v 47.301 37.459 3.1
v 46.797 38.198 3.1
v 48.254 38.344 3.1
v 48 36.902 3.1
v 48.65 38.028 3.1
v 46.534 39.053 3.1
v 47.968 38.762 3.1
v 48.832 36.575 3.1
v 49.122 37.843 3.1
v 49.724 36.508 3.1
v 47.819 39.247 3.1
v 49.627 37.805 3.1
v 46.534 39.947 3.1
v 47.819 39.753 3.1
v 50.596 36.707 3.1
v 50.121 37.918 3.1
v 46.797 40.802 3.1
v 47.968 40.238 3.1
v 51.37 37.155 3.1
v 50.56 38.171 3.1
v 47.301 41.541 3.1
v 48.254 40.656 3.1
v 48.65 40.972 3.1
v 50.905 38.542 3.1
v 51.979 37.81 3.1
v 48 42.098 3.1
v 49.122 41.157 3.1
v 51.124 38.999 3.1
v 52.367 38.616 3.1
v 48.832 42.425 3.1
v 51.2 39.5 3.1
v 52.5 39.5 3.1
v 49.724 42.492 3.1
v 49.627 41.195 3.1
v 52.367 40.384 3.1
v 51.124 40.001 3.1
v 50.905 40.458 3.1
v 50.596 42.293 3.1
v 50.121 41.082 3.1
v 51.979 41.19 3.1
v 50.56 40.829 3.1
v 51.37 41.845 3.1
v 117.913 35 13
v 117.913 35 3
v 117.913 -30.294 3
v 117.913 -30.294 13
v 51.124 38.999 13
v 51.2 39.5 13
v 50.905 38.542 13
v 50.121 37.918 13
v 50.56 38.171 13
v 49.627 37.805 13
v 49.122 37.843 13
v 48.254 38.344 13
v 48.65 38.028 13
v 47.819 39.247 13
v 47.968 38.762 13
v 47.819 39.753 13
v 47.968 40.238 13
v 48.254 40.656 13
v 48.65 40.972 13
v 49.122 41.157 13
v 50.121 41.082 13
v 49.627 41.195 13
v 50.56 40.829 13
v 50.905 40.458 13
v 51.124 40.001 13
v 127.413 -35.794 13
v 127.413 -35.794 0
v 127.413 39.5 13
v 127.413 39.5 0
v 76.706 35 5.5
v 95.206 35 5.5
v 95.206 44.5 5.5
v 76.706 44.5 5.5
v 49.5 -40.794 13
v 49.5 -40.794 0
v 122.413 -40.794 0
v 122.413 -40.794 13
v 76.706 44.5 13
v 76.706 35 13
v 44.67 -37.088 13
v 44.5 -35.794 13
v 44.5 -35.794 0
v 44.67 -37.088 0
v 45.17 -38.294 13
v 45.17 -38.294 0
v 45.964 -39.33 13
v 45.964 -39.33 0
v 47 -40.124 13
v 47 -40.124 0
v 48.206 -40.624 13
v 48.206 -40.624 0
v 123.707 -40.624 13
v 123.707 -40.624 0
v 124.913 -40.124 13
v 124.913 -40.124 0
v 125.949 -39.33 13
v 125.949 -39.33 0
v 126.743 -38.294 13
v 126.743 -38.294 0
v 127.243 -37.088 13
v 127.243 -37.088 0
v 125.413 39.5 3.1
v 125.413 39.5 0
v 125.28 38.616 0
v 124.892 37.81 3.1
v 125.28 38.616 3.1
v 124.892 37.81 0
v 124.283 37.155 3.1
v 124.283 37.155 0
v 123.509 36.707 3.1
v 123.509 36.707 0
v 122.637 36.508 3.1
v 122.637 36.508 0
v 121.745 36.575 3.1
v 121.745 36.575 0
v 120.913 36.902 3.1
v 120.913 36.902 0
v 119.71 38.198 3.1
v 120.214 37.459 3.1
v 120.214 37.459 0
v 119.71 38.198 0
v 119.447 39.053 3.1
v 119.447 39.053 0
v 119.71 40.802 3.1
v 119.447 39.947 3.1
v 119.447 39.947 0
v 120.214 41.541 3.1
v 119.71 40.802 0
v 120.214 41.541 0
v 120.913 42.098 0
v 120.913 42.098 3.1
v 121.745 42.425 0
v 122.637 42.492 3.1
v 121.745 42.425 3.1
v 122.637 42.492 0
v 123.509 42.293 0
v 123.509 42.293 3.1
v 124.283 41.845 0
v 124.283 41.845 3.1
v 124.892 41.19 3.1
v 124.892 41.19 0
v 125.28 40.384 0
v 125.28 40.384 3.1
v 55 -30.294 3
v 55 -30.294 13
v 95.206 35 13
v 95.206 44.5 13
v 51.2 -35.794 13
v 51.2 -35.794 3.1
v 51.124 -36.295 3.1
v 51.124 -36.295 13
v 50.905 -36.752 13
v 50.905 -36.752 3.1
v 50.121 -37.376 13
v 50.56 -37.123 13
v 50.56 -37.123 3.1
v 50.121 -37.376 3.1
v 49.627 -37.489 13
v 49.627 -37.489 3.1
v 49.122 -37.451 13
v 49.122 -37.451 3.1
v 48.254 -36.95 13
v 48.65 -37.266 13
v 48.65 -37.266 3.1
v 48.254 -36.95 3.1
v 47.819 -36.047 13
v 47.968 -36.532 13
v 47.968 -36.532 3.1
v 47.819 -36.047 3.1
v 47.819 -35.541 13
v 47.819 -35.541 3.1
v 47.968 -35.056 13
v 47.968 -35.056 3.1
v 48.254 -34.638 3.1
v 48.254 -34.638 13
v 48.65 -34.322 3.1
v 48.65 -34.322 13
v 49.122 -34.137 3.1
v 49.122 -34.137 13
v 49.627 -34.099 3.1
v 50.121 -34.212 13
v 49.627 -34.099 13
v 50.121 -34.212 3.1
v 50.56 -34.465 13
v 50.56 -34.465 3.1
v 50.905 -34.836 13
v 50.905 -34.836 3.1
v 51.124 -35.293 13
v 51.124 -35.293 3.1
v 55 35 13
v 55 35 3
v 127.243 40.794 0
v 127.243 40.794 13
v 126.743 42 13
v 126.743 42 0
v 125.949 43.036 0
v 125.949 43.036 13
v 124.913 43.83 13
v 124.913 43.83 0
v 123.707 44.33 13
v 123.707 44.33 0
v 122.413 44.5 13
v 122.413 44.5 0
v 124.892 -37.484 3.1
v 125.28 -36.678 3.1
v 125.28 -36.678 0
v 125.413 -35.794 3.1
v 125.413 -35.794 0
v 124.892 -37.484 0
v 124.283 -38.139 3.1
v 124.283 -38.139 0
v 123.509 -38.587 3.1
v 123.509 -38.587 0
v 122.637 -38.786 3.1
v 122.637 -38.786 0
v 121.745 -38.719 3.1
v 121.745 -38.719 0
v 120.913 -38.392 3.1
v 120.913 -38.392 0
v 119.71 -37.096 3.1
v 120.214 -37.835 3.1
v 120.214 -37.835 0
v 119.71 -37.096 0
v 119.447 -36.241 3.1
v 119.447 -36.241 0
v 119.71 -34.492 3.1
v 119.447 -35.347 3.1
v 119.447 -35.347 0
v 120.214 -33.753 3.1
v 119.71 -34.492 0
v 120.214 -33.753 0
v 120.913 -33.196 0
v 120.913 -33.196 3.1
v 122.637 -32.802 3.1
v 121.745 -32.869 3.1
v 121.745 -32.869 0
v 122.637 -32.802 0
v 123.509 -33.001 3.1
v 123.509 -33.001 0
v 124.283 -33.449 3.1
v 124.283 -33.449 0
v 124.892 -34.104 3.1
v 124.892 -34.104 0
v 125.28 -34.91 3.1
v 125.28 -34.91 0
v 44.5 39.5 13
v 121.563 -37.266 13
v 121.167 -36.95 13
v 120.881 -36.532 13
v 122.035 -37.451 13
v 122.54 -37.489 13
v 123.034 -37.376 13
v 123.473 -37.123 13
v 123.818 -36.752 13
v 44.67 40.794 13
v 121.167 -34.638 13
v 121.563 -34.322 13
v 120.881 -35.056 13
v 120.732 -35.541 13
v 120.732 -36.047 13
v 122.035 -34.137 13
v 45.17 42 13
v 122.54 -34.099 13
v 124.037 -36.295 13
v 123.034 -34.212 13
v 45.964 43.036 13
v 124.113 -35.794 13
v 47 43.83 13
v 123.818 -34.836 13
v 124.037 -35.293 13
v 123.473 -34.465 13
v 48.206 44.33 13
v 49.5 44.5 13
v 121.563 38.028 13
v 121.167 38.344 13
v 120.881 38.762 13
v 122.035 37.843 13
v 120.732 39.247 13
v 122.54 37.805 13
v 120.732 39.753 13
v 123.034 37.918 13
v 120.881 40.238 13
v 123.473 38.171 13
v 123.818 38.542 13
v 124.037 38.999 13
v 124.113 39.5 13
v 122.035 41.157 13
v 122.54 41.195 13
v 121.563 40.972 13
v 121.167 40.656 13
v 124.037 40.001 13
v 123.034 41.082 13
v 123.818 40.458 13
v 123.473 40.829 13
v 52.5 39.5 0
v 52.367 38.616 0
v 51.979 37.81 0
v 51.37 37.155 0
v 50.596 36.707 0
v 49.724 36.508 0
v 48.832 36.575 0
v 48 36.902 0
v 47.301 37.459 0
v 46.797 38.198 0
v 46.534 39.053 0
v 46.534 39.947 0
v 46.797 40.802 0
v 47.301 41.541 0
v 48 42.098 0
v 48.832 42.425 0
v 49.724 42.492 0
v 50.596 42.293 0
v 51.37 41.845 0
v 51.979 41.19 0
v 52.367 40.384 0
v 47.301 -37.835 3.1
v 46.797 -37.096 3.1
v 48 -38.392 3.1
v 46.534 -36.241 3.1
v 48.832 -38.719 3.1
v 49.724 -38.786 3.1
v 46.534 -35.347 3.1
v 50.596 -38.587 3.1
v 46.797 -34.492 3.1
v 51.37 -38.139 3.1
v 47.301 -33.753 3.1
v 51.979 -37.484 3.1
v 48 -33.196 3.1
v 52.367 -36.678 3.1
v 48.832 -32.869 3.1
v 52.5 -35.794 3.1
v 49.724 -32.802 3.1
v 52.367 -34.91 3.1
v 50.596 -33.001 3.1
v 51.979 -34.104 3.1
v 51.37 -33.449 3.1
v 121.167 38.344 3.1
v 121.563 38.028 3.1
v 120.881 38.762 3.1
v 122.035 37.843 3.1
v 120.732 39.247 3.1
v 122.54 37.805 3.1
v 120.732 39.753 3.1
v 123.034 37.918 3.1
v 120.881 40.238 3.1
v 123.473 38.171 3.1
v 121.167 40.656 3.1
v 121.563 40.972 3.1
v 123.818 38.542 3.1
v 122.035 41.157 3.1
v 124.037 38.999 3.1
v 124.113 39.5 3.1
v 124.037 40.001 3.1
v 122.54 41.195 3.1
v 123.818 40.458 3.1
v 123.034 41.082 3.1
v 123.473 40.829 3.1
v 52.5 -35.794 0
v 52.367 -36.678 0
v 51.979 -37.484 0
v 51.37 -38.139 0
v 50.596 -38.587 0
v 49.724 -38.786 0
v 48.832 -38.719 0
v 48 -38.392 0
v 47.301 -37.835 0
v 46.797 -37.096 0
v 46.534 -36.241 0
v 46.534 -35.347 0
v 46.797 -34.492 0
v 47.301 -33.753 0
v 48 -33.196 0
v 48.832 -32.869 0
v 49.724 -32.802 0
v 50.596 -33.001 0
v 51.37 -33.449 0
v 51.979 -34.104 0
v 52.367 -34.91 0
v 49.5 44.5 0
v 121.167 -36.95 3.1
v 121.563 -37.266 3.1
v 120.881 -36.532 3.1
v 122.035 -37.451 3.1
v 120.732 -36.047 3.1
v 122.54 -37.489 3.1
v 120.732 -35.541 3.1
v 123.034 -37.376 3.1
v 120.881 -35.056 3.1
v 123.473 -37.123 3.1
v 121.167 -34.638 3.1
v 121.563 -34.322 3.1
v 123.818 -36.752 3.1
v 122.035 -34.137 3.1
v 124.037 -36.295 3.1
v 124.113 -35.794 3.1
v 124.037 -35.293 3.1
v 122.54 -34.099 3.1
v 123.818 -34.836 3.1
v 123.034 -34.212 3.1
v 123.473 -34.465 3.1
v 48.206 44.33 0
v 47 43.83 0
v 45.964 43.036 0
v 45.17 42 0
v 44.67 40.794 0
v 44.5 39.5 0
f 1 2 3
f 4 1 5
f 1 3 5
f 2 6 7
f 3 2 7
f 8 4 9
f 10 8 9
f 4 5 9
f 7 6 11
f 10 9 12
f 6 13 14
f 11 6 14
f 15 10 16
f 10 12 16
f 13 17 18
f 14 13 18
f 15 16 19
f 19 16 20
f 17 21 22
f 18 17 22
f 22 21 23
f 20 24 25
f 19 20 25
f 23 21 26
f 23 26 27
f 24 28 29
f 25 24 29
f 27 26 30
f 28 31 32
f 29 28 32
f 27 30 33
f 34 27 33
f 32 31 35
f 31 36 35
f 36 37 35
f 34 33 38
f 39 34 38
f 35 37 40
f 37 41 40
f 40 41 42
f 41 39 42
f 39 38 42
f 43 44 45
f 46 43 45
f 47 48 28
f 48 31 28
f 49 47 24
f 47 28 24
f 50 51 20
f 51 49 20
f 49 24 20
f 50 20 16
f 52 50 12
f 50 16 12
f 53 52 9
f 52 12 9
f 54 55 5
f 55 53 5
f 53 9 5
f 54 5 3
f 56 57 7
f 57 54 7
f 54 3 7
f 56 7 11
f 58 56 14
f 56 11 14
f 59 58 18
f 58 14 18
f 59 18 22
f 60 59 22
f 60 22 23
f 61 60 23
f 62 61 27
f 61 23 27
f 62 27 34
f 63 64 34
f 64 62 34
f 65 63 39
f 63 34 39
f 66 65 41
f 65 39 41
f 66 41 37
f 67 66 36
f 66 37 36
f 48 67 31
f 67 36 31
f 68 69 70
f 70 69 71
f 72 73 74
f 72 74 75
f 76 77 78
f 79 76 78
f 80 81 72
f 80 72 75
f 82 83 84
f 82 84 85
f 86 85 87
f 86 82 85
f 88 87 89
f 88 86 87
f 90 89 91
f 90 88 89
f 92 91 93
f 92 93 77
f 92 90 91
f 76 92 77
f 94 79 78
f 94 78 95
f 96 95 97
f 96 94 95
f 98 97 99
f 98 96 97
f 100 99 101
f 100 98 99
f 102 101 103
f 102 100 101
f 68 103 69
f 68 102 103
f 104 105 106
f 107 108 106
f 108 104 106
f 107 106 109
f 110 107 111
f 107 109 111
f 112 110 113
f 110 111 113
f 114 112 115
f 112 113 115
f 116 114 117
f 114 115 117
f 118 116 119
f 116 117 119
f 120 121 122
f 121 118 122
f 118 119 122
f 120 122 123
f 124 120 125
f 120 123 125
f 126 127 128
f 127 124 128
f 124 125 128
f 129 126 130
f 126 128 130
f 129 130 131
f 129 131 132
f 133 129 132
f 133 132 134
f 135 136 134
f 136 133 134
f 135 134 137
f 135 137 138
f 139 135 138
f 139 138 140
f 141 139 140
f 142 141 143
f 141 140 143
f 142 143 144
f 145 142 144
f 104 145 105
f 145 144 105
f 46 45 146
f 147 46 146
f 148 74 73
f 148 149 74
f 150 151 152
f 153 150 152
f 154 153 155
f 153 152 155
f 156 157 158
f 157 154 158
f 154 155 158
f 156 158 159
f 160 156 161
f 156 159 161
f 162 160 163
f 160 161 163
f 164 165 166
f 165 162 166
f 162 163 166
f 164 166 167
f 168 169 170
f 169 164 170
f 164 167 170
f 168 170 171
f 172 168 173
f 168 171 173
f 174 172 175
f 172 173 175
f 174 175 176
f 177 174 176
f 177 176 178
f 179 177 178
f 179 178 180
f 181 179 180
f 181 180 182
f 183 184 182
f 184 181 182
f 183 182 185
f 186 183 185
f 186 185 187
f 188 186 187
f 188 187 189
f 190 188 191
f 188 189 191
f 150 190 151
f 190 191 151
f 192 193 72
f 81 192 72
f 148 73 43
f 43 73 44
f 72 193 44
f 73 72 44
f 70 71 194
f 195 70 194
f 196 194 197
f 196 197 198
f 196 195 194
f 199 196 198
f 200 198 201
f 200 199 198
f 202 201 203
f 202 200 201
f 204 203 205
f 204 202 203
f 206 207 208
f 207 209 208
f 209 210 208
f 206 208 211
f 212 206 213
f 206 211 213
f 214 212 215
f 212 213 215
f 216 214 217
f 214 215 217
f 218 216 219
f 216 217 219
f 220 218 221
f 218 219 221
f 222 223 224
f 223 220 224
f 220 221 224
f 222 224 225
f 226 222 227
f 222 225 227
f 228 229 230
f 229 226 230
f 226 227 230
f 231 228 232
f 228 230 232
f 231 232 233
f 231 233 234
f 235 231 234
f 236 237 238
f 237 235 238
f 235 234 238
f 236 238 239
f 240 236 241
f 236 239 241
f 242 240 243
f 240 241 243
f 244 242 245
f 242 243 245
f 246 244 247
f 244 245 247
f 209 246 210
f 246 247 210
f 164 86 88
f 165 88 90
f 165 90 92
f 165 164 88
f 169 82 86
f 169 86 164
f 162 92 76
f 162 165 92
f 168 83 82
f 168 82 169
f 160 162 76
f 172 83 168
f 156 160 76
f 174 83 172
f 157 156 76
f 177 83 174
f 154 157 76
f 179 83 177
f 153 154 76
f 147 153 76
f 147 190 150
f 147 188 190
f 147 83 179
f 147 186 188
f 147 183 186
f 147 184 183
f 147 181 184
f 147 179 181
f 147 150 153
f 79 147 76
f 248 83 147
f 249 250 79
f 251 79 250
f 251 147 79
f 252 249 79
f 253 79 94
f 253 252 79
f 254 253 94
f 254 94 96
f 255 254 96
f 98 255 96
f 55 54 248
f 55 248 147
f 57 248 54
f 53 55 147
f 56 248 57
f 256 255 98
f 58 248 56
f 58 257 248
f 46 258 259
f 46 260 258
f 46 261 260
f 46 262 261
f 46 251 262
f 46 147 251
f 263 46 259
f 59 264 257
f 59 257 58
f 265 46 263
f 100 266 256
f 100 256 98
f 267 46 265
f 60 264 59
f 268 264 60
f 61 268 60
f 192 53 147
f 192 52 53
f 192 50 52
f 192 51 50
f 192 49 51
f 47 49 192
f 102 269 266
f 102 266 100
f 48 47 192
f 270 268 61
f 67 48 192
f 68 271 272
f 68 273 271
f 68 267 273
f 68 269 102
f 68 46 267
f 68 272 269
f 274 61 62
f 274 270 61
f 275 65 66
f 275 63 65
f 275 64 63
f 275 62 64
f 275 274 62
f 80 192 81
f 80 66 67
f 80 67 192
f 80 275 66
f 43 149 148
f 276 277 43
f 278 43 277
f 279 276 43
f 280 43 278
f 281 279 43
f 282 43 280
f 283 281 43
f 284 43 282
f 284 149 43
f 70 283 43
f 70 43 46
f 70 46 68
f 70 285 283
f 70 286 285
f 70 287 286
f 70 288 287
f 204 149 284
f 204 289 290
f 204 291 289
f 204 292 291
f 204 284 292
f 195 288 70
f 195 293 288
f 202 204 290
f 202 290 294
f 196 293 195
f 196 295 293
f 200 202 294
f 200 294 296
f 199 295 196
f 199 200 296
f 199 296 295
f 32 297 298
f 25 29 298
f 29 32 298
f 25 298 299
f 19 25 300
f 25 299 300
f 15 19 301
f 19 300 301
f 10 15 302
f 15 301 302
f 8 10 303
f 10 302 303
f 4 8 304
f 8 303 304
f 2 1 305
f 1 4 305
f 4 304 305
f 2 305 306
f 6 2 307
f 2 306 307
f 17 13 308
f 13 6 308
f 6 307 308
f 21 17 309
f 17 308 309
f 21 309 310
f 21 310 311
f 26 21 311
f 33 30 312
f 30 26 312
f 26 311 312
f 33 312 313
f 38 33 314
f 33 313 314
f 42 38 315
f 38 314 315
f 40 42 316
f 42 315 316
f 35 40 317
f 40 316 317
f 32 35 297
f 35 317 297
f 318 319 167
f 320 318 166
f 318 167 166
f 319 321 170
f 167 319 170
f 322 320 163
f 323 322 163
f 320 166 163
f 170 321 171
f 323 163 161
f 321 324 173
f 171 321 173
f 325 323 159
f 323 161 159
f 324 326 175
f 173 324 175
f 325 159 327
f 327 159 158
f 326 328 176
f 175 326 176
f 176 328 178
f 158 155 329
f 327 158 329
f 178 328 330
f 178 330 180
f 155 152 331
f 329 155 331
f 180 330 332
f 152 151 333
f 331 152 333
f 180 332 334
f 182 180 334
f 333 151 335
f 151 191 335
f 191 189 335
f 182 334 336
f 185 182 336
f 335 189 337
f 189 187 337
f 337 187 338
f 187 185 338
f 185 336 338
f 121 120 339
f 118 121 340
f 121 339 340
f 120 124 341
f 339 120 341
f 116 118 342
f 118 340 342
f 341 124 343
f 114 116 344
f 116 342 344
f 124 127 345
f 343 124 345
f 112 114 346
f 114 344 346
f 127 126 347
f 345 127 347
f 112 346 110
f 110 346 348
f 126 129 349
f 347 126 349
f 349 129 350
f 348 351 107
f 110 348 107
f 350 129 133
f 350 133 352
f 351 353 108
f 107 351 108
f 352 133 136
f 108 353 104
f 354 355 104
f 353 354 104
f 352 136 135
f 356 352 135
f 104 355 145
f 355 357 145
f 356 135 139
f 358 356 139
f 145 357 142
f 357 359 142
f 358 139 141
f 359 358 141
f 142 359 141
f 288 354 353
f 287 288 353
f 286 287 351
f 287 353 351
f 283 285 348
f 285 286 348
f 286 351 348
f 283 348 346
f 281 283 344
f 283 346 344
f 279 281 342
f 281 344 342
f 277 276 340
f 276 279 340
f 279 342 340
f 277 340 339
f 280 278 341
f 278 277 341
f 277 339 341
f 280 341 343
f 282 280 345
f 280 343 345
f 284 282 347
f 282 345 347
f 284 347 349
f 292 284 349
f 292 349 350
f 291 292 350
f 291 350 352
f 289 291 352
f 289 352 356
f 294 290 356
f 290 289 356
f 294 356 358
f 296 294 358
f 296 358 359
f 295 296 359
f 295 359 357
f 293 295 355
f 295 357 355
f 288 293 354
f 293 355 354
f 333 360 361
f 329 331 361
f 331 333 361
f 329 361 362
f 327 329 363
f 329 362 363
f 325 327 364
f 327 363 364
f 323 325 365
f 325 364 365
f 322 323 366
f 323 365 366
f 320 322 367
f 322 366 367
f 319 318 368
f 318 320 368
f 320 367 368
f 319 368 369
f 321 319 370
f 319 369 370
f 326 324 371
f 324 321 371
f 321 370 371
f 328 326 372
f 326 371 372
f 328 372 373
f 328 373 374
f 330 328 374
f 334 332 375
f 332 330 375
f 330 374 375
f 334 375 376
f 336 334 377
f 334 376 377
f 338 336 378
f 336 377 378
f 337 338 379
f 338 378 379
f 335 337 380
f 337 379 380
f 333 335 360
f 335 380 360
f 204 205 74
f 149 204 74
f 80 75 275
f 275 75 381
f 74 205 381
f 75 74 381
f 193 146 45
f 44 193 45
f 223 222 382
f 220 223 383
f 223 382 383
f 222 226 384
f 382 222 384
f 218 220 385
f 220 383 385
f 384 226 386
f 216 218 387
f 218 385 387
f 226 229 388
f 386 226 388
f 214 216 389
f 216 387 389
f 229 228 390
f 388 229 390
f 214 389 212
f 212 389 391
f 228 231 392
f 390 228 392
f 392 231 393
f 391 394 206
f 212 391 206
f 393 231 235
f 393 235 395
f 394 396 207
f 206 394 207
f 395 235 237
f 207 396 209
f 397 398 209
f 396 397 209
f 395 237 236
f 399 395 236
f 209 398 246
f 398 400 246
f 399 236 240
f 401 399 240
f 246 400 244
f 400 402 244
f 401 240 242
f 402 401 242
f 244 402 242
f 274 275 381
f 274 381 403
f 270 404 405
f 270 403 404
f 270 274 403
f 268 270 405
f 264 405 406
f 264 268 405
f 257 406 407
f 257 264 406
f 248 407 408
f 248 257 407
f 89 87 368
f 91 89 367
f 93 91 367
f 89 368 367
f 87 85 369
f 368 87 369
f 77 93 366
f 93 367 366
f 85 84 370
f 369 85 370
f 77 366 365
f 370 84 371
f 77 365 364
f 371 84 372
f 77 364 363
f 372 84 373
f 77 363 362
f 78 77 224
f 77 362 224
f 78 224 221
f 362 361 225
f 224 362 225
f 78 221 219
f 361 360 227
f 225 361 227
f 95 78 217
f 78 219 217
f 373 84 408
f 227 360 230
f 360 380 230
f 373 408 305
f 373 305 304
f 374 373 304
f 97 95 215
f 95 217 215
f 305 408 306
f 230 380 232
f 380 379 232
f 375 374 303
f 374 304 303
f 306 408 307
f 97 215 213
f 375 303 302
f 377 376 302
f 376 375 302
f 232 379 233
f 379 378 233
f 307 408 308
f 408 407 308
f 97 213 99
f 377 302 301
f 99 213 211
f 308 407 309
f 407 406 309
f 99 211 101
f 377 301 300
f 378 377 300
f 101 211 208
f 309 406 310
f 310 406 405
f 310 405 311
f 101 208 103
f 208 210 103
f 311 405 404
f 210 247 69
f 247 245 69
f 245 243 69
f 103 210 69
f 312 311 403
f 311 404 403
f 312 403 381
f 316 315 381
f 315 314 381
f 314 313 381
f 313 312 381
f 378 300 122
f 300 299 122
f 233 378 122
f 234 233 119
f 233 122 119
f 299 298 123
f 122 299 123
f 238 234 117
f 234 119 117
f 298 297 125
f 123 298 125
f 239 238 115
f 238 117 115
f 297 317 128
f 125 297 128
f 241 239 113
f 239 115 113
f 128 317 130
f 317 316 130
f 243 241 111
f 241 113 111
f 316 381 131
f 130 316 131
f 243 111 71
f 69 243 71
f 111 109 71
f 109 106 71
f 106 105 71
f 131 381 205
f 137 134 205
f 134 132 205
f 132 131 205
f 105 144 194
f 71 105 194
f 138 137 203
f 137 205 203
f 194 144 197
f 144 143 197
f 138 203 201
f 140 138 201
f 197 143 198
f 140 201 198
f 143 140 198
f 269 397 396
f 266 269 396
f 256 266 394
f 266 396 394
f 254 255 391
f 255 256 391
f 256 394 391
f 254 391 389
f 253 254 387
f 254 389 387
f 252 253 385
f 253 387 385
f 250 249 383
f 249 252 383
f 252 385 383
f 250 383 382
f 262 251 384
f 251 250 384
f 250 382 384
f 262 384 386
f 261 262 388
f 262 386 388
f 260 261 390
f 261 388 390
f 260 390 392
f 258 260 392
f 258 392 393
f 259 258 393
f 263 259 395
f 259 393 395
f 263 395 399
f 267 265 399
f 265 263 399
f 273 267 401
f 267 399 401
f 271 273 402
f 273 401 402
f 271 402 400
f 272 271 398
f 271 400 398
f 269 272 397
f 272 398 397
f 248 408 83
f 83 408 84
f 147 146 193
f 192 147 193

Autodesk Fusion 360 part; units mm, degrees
sketch "Sketch1" plane through (0, 0, 0) normal (0, 0, 1) x (1, 0, 0)
  line L0 (55, 35) -> (117.913, 35)
  line L1 (117.913, 35) -> (117.913, -30.294)
  line L2 (117.913, -30.294) -> (55, -30.294)
  line L3 (55, -30.294) -> (55, 35)
  line L4 (44.5, -40.794) -> (127.413, -40.794)
  line L5 (127.413, -40.794) -> (127.413, 44.5)
  line L6 (127.413, 44.5) -> (44.5, 44.5)
  line L7 (44.5, 44.5) -> (44.5, -40.794)
  circle A0 centre (49.5, -35.794) radius 1.7
  circle A1 centre (49.5, 39.5) radius 1.7
  circle A2 centre (122.413, 39.5) radius 1.7
  circle A3 centre (122.413, -35.794) radius 1.7
  circle A4 centre (49.5, -35.794) radius 3
  circle A5 centre (49.5, 39.5) radius 3
  circle A6 centre (122.413, 39.5) radius 3
  circle A7 centre (122.413, -35.794) radius 3
  dimension "d1" = 62.913
  dimension "d2" = 65.294
  dimension "d3" = 82.913
  dimension "d4" = 85.294
  dimension "d5" = 9.5
  dimension "d6" = 9.5
  dimension "d7" = 3.4
  dimension "d8" = 3.4
  dimension "d9" = 3.4
  dimension "d10" = 3.4
  dimension "d11" = 5
  dimension "d12" = 5
  dimension "d13" = 5
  dimension "d14" = 5
  dimension "d15" = 5
  dimension "d16" = 5
  dimension "d17" = 5
  dimension "d18" = 5
  dimension "d19" = 6
  dimension "d20" = 6
  dimension "d21" = 6
  dimension "d22" = 6
extrude "Extrude1" add sketch "Sketch1" along normal blind 9.9 from surface at 3.1 contours A4 | A5 | A6 | A7 makes body 1 at (123.2255, -32.9061, 9.7) makes body 2 at (123.2255, 42.3879, 9.7) makes body 3 at (46.5037, -35.9435, 9.7) makes body 4 at (46.5037, 39.3505, 9.7)
extrude "Extrude2" add sketch "Sketch1" along normal blind 13 contours L4 L5 L6 L7 bodies 1 2 3 4
extrude "Extrude3" add sketch "Sketch1" along normal blind 3 contours L0 L1 L2 L3 bodies 1
sketch "Sketch2" plane through (0, 0, 13) normal (0, 0, 1) x (-1, 0, 0)
  circle A0 centre (-122.413, 35.794) radius 1.7
  circle A1 centre (-49.5, -39.5) radius 1.7
  line L0 (-117.913, 30.294) -> (-55, 30.294)
  line L1 (-55, 30.294) -> (-55, -35)
  line L2 (-55, -35) -> (-117.913, -35)
  line L3 (-117.913, -35) -> (-117.913, 30.294)
  line L4 (-44.5, -44.5) -> (-44.5, 40.794)
  line L5 (-44.5, 40.794) -> (-127.413, 40.794)
  line L6 (-127.413, 40.794) -> (-127.413, -44.5)
  line L7 (-127.413, -44.5) -> (-44.5, -44.5)
  circle A2 centre (-122.413, -39.5) radius 1.7
  circle A3 centre (-49.5, 35.794) radius 1.7
  line L8 (-76.7065, -44.5) -> (-95.2065, -44.5)
  line L9 (-95.2065, -44.5) -> (-95.2065, -35)
  line L10 (-95.2065, -35) -> (-76.7065, -35)
  line L11 (-76.7065, -35) -> (-76.7065, -44.5)
  line L12 (-44.5, -44.5) -> (-44.5, 40.794)
  dimension "d30" = 18.5
  dimension "d31" = 32.2065
extrude "Extrude4" cut sketch "Sketch2" against normal blind 7.5 contours L2 L7 L8 L9 L10 L11 bodies 1
fillet "Fillet1" radius 5 4 edges at (44.5, 44.5, 6.5) (44.5, -40.794, 6.5) (127.413, 44.5, 6.5) (127.413, -40.794, 6.5) on bodies 1
sketch "Sketch3" plane through (0, 0, 13) normal (0, 0, 1) x (-1, 0, 0)
  circle A0 centre (-49.5, 35.794) radius 1.7
  circle A1 centre (-122.413, -39.5) radius 1.7
  arc A2 (-122.413, 40.794) -> (-127.413, 35.794) centre (-122.413, 35.794) ccw
  line L0 (-127.413, 35.794) -> (-127.413, -39.5)
  arc A3 (-127.413, -39.5) -> (-122.413, -44.5) centre (-122.413, -39.5) ccw
  line L1 (-122.413, -44.5) -> (-95.2065, -44.5)
  line L2 (-95.2065, -44.5) -> (-95.2065, -35)
  line L3 (-95.2065, -35) -> (-117.913, -35)
  line L4 (-117.913, -35) -> (-117.913, 30.294)
  line L5 (-117.913, 30.294) -> (-55, 30.294)
  line L6 (-55, 30.294) -> (-55, -35)
  line L7 (-55, -35) -> (-76.7065, -35)
  line L8 (-76.7065, -35) -> (-76.7065, -44.5)
  line L9 (-76.7065, -44.5) -> (-49.5, -44.5)
  arc A4 (-49.5, -44.5) -> (-44.5, -39.5) centre (-49.5, -39.5) ccw
  line L10 (-44.5, -39.5) -> (-44.5, 35.794)
  arc A5 (-44.5, 35.794) -> (-49.5, 40.794) centre (-49.5, 35.794) ccw
  line L11 (-49.5, 40.794) -> (-122.413, 40.794)
  circle A6 centre (-49.5, -39.5) radius 1.7
  circle A7 centre (-122.413, 35.794) radius 1.7
sketch "Sketch4" plane through (0, 0, 13) normal (0, 0, 1) x (-1, 0, 0)
